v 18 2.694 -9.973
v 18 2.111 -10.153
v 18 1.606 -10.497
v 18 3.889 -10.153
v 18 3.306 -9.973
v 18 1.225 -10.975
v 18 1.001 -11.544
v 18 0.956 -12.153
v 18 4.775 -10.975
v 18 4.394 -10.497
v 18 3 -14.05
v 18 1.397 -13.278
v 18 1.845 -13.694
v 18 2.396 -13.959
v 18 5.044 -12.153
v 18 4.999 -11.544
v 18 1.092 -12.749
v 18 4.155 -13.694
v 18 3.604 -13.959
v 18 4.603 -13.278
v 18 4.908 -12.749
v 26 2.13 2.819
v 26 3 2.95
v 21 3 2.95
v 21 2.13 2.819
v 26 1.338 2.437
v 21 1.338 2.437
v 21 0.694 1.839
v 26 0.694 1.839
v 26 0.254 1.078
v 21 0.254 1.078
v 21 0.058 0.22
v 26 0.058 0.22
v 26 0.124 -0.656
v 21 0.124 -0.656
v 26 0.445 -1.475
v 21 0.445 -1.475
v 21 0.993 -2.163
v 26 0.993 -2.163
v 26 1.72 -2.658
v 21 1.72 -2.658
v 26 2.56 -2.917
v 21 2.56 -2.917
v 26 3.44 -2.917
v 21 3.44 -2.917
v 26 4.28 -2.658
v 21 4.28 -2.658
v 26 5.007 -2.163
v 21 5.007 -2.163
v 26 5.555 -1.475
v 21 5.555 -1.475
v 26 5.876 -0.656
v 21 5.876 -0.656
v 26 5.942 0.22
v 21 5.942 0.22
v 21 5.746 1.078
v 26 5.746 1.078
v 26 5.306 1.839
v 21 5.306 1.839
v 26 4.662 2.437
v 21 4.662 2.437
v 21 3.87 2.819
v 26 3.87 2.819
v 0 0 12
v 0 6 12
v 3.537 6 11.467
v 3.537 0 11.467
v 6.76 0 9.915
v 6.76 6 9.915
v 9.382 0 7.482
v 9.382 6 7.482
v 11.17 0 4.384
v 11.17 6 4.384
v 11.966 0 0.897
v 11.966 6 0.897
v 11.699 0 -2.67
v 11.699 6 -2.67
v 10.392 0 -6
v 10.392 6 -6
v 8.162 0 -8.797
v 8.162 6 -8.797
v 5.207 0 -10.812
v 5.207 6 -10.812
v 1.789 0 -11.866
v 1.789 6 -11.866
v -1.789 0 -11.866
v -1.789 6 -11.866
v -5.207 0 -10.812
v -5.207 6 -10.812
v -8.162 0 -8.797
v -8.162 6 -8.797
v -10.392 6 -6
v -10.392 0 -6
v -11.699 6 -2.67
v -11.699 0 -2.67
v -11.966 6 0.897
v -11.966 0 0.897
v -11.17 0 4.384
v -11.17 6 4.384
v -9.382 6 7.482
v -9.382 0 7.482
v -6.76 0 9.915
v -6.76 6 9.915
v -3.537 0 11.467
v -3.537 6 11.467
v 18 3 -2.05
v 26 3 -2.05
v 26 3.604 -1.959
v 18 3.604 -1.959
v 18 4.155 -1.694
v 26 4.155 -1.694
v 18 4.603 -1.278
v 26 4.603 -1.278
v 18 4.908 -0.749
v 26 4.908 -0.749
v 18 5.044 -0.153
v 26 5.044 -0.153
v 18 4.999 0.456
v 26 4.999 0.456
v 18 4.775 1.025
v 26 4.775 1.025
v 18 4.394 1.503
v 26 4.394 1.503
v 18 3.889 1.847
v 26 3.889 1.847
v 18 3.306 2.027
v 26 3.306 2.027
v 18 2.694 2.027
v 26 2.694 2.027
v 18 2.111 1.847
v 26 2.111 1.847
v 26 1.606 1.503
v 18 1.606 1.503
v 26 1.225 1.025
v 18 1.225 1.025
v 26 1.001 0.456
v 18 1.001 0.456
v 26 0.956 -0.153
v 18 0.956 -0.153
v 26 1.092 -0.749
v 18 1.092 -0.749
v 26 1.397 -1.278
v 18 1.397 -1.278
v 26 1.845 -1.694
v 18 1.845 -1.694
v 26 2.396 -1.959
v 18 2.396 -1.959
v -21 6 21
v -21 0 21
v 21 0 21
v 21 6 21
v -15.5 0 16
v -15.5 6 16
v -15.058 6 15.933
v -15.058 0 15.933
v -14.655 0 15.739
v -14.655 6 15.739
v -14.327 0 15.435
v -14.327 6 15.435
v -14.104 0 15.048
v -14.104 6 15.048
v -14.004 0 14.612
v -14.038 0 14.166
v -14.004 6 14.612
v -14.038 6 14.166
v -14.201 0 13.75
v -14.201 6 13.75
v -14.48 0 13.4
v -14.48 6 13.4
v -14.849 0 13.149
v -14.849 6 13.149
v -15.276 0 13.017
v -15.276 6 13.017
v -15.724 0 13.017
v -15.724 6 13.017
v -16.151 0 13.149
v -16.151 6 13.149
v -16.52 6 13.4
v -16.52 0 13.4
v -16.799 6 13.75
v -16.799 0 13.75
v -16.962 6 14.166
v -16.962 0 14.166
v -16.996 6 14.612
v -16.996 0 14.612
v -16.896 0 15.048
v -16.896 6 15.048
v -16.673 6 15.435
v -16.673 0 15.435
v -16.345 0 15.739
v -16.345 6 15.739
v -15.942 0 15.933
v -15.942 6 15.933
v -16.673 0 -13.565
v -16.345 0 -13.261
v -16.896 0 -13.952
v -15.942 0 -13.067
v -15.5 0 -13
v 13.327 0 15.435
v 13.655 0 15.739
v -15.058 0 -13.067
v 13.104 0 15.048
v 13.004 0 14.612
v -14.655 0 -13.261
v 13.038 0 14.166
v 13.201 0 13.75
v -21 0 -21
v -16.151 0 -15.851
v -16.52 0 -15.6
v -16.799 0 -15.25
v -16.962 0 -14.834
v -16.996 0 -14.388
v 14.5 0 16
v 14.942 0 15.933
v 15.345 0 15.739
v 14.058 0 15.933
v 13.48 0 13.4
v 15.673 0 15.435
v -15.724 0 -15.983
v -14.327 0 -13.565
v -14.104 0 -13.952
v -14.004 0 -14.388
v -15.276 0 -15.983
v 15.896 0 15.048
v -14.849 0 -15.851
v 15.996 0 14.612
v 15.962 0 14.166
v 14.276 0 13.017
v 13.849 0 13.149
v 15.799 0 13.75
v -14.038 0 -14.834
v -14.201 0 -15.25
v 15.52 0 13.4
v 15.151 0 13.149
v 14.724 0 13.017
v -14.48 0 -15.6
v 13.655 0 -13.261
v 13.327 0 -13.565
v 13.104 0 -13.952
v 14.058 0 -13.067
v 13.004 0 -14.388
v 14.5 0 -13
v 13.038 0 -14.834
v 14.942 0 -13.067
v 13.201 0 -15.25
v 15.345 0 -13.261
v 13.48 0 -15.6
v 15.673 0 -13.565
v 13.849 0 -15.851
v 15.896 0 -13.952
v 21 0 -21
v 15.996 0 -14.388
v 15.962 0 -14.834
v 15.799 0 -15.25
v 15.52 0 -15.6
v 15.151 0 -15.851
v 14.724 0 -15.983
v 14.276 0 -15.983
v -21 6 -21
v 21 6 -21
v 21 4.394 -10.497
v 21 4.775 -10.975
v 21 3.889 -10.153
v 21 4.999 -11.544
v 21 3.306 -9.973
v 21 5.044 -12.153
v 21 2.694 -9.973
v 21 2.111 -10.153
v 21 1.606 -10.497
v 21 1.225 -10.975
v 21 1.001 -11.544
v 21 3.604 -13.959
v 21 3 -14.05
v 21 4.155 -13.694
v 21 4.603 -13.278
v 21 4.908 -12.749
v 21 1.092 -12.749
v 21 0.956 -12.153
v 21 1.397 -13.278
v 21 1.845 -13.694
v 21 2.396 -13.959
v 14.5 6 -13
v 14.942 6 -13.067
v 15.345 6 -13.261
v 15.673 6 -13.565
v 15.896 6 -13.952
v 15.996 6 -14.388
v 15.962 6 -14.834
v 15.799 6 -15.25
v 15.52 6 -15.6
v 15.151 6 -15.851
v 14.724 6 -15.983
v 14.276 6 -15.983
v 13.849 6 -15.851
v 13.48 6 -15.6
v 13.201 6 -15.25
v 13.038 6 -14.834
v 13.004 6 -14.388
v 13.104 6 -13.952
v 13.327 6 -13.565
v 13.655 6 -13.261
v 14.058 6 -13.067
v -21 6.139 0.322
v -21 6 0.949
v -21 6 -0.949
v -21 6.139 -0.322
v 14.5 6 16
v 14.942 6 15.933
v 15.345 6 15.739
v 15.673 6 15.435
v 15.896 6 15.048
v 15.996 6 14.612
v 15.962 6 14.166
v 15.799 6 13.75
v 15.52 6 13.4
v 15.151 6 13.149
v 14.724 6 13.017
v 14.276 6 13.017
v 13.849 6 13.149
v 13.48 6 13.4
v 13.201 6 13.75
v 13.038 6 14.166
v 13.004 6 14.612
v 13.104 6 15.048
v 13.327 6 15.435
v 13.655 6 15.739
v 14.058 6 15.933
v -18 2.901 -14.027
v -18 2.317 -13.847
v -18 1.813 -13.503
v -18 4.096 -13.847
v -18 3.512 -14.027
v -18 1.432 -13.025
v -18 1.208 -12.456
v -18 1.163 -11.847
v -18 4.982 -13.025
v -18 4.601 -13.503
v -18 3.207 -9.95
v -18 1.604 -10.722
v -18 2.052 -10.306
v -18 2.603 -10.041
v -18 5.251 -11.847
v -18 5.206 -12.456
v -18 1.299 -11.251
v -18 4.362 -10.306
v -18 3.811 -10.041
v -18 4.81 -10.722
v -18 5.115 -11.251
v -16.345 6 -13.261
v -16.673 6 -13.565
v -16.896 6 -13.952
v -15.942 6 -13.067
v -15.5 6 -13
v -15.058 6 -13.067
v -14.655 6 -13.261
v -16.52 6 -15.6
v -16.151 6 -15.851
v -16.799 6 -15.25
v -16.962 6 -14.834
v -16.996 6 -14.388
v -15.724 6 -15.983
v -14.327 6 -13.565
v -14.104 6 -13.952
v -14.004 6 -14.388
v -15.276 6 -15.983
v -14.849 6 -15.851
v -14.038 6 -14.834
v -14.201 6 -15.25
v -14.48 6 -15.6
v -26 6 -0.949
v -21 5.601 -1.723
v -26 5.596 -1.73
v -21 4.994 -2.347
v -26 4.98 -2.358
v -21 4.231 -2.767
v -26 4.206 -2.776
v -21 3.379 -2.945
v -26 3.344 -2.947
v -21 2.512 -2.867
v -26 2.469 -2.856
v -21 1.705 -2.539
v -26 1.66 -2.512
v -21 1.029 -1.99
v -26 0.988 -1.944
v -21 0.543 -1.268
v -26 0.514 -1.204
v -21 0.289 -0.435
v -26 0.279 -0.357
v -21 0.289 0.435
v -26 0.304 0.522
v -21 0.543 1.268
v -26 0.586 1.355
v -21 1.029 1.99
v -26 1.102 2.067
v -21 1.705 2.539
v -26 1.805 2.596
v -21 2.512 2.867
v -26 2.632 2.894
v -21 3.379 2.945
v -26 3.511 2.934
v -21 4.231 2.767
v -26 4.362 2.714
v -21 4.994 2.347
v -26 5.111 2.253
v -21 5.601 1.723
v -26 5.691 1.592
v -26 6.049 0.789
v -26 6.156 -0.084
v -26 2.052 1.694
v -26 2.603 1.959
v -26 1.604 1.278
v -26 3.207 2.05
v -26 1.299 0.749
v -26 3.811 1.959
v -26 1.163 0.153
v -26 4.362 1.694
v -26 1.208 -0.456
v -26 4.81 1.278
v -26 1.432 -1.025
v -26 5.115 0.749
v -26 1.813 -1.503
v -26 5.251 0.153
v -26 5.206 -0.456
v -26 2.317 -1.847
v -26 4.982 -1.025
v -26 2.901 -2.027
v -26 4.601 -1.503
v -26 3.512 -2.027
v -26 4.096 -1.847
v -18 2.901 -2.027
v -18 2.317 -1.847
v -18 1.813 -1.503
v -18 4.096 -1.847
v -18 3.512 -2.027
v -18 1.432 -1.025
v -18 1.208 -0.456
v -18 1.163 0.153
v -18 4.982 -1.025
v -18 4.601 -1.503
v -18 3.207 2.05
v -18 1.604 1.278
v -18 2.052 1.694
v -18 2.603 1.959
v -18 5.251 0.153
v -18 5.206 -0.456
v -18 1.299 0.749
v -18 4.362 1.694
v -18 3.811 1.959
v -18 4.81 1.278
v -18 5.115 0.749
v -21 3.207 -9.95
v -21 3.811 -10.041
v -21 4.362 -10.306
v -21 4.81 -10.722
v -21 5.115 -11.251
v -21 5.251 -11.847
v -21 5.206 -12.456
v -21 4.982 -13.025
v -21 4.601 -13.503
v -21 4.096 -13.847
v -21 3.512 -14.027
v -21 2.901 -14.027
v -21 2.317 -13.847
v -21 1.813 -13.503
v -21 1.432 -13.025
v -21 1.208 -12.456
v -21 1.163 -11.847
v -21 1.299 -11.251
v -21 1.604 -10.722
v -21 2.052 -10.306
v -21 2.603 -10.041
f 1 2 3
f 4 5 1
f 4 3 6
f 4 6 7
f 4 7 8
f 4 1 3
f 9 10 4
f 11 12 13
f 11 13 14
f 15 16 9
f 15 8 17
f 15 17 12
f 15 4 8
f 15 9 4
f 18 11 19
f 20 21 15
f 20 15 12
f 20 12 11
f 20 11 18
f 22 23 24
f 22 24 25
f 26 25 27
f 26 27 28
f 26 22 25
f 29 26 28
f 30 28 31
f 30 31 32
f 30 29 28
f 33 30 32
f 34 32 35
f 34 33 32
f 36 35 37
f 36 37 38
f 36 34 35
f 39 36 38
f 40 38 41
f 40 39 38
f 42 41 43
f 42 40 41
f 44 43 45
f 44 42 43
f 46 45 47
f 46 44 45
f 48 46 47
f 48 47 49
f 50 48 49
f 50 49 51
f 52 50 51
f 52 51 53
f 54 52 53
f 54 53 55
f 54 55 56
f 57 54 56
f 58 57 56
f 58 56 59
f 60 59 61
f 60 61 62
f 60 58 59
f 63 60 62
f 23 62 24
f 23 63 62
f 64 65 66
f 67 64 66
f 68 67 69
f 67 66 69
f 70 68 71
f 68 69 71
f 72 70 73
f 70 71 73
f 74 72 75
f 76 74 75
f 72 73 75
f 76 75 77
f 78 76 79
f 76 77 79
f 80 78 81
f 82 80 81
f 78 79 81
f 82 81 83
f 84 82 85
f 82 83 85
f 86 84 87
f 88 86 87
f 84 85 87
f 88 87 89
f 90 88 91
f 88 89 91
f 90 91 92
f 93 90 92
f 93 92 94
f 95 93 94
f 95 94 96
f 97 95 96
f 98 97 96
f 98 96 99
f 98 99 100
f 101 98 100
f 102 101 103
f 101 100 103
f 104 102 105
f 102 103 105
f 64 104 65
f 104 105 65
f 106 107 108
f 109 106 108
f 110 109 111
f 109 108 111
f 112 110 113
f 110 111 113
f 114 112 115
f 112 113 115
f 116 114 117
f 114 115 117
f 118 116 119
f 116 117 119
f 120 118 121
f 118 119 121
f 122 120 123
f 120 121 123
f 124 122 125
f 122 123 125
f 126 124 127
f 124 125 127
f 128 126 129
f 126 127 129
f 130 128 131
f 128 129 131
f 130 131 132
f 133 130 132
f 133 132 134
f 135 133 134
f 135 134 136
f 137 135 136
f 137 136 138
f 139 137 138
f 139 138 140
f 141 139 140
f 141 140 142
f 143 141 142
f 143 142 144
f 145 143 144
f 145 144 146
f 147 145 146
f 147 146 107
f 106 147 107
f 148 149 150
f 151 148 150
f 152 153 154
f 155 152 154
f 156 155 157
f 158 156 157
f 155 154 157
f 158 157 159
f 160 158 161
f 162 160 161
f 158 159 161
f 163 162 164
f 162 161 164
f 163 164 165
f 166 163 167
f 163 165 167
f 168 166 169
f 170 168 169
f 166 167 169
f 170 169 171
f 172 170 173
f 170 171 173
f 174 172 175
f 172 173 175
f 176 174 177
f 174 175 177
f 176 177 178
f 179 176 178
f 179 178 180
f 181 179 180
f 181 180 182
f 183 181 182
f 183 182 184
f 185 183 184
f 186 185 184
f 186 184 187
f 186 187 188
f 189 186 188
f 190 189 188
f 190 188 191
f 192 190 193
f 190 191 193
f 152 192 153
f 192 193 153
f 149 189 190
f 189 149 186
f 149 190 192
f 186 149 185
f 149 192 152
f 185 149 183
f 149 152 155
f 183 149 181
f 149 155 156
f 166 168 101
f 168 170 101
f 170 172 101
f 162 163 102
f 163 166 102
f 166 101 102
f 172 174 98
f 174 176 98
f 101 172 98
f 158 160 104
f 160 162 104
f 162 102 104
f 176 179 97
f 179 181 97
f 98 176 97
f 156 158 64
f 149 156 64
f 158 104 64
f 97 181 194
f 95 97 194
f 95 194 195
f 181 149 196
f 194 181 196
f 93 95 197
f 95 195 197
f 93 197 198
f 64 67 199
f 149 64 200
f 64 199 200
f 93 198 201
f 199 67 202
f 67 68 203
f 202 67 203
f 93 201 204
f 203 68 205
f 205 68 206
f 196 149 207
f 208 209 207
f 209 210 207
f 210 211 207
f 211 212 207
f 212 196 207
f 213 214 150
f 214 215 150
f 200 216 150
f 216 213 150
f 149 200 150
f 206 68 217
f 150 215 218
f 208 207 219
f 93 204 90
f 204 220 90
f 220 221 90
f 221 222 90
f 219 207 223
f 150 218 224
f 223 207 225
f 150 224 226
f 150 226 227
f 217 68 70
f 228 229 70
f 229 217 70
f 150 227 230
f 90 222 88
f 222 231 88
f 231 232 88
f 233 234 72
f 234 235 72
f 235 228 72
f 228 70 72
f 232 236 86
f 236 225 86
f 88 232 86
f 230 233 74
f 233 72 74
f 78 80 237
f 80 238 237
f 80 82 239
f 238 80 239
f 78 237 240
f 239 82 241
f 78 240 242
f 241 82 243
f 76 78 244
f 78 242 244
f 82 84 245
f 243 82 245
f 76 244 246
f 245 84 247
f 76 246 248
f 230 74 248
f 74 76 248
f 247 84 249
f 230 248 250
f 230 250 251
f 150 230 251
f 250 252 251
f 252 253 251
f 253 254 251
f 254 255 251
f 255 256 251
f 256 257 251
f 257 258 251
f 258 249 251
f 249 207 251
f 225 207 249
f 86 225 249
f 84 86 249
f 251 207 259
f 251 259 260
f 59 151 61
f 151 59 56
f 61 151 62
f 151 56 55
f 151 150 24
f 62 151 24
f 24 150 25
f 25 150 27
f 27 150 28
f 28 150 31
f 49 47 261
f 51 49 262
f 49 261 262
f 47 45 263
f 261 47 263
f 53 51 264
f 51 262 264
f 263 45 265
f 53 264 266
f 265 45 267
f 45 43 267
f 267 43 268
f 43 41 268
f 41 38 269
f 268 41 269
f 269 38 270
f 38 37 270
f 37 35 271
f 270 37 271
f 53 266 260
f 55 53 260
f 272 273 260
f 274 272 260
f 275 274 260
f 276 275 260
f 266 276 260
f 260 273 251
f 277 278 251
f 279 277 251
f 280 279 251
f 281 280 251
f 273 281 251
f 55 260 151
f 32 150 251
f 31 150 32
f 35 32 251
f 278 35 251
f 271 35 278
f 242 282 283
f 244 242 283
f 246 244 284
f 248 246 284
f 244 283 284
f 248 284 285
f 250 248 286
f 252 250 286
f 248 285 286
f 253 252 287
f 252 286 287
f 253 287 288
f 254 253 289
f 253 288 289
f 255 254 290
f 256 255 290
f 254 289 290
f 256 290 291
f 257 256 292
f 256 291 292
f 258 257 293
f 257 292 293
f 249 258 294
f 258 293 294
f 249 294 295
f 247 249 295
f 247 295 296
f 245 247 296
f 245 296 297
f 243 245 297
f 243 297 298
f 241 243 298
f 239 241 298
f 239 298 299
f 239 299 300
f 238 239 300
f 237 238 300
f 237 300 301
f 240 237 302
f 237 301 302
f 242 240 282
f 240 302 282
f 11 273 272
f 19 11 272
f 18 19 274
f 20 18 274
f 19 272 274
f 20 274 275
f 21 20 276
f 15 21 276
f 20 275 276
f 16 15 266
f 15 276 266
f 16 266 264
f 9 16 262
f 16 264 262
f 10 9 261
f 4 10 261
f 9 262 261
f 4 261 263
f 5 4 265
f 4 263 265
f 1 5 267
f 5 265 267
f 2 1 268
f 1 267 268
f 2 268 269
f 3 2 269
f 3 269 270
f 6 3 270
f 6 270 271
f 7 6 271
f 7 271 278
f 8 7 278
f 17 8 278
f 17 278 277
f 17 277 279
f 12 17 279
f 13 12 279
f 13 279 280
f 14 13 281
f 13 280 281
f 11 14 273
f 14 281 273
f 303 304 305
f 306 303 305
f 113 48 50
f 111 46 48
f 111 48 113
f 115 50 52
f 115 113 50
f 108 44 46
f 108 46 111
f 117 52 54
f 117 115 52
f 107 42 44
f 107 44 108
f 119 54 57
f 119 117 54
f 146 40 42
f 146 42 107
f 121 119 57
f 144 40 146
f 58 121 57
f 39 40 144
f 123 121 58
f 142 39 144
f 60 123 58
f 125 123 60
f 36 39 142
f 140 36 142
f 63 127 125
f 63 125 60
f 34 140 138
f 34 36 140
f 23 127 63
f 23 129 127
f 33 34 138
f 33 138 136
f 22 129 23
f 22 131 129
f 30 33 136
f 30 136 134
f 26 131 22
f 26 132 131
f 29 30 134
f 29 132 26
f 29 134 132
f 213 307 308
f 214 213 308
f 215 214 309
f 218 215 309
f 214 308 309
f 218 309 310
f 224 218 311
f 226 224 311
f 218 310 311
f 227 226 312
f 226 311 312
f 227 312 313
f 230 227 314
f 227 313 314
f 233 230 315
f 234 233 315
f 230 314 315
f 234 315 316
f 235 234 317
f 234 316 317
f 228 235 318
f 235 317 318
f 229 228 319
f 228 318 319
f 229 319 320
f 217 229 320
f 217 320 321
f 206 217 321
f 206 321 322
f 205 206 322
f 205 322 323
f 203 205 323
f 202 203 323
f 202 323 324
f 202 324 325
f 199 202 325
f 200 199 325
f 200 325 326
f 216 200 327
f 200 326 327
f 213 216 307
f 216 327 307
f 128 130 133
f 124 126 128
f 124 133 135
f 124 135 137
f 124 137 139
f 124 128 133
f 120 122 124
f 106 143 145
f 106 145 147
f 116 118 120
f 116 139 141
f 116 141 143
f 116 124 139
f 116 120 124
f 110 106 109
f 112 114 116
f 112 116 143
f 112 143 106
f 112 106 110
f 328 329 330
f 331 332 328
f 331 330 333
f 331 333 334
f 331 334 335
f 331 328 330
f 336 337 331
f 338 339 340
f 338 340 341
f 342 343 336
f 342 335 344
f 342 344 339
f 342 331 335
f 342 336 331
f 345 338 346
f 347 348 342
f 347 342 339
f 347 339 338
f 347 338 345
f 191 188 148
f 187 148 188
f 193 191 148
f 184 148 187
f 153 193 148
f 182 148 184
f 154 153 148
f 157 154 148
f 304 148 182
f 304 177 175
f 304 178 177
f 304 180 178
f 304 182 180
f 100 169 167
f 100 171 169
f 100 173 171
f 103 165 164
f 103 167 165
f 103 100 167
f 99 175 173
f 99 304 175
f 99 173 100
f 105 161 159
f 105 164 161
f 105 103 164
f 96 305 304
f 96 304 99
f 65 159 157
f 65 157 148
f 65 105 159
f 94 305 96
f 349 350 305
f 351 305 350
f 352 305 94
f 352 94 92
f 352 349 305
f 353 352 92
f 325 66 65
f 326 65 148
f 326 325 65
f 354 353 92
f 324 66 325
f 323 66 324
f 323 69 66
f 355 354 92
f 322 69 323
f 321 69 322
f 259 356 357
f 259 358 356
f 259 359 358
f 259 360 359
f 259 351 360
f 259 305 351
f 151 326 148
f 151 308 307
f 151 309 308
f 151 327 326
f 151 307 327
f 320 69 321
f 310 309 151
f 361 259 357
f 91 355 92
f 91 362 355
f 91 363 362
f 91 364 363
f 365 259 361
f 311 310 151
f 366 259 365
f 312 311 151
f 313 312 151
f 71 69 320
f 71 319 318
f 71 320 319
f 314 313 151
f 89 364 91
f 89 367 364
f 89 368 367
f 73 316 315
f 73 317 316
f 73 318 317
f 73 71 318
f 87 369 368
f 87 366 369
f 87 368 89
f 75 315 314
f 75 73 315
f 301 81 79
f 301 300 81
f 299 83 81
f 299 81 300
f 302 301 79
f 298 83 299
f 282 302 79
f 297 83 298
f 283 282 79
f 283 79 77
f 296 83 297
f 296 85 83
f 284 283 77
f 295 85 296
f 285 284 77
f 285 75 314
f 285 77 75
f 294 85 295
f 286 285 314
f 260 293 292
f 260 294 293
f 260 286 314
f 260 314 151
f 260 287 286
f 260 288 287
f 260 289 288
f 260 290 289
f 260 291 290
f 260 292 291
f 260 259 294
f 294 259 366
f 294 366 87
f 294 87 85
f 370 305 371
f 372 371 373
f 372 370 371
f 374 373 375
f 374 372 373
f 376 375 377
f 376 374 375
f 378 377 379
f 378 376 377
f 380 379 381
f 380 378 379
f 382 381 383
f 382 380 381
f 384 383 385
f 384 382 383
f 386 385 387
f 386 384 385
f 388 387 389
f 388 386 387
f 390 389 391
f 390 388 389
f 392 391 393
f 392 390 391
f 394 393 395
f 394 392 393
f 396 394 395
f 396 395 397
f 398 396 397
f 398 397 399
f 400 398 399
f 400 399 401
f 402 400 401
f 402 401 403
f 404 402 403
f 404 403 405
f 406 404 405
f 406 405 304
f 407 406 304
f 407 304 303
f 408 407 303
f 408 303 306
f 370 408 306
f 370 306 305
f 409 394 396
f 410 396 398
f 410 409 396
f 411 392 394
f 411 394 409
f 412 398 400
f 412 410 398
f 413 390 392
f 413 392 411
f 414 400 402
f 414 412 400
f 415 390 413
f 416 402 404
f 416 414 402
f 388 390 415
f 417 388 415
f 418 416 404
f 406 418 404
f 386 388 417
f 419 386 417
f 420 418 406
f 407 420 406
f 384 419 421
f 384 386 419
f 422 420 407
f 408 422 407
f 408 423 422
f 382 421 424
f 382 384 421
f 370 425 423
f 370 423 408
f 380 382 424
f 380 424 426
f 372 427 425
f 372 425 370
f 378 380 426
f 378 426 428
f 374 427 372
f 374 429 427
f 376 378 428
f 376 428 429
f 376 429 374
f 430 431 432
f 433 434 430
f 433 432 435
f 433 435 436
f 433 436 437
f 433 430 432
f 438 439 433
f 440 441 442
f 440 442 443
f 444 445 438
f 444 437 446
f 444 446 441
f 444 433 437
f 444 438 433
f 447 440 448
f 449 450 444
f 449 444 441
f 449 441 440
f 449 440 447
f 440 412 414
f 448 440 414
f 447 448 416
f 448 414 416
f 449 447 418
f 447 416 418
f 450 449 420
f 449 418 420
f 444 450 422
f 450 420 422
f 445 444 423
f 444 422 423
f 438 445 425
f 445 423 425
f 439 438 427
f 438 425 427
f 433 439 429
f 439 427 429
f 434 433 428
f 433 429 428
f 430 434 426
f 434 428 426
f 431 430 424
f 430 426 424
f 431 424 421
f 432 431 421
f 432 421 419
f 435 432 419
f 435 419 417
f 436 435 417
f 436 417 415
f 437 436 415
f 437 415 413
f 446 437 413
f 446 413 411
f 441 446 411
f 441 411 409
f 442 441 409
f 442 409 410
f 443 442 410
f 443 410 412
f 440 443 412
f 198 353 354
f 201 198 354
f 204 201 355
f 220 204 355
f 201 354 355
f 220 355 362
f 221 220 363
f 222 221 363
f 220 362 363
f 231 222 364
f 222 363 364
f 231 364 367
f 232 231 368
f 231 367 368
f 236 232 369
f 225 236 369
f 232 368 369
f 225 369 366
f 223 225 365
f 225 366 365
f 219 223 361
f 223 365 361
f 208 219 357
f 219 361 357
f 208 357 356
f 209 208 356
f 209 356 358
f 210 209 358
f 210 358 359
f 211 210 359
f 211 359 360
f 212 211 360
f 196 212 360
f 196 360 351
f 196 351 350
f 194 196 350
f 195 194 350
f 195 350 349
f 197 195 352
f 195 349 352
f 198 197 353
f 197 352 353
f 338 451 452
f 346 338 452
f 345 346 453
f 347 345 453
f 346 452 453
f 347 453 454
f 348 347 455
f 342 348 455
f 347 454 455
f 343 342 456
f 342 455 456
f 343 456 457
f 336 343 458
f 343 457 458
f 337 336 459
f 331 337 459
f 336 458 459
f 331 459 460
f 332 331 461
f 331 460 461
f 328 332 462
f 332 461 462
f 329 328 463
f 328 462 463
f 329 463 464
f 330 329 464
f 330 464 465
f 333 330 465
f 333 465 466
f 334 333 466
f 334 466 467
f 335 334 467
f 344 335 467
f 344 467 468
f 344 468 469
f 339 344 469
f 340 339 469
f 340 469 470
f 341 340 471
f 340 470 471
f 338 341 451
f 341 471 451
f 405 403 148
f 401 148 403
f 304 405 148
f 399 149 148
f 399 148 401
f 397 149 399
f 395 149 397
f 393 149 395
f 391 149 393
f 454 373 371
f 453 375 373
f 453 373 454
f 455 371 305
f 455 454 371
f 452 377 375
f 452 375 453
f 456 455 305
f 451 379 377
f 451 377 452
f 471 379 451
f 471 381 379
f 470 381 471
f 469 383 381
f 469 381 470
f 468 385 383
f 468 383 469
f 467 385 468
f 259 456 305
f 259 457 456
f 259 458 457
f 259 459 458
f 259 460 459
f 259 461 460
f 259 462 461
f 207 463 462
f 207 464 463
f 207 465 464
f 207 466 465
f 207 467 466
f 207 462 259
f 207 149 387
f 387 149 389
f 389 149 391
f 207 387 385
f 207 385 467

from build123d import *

# Parameters (mm, degrees)
CROQUIS1_W              = 42
CROQUIS1_H              = 42
SALIENTE_EXTRUIR1_DEPTH = 6
CROQUIS2_R              = 1.5
CROQUIS2_R_2            = 12
CORTAR_EXTRUIR2_DEPTH   = 6
CROQUIS4_R              = 2.05
CORTAR_EXTRUIR3_DEPTH   = 3
CROQUIS5_R              = 2.05
CORTAR_EXTRUIR4_DEPTH   = 3
SALIENTE_EXTRUIR2_START = 5
CROQUIS6_R              = 2.95
CROQUIS6_R_2            = 2.05
SALIENTE_EXTRUIR2_DEPTH = 5
SALIENTE_EXTRUIR3_START = 5
CROQUIS7_R              = 2.95
CROQUIS7_R_2            = 2.05
SALIENTE_EXTRUIR3_DEPTH = 5


with BuildPart() as part:
    # Croquis1 → Saliente-Extruir1 (new body)
    with BuildSketch(Plane(origin=(0, 0, 0), x_dir=(1, 0, 0), z_dir=(0, 1, 0))):
        Rectangle(CROQUIS1_W, CROQUIS1_H)
    extrude(amount=SALIENTE_EXTRUIR1_DEPTH)

    # Croquis2 → Cortar-Extruir2 (cut)
    with BuildSketch(Plane(origin=(0, 6, 0), x_dir=(1, 0, 0), z_dir=(0, 1, 0))):
        with Locations(Location((-15.5, -14.5, 0), (0, 0, 270))):
            Circle(CROQUIS2_R)
        with Locations(Location((14.5, -14.5, 0), (0, 0, 270))):
            Circle(CROQUIS2_R)
        with Locations(Location((14.5, 14.5, 0), (0, 0, 270))):
            Circle(CROQUIS2_R)
        with Locations(Location((-15.5, 14.5, 0), (0, 0, 270))):
            Circle(CROQUIS2_R)
        with Locations(Location((0, 0, 0), (0, 0, 270))):
            Circle(CROQUIS2_R_2)
    extrude(amount=-CORTAR_EXTRUIR2_DEPTH, mode=Mode.SUBTRACT)

    # Croquis4 → Cortar-Extruir3 (cut)
    with BuildSketch(Plane(origin=(21, 0, 0), x_dir=(0, 0, -1), z_dir=(1, 0, 0))):
        with Locations((12, 3)):
            Circle(CROQUIS4_R)
        with Locations((0, 3)):
            Circle(CROQUIS4_R)
    extrude(amount=-CORTAR_EXTRUIR3_DEPTH, mode=Mode.SUBTRACT)

    # Croquis5 → Cortar-Extruir4 (cut)
    with BuildSketch(Plane.ZY.offset(21)):
        with Locations((-12, 3.206908841)):
            Circle(CROQUIS5_R)
        with Locations((0, 3.206908841)):
            Circle(CROQUIS5_R)
    extrude(amount=-CORTAR_EXTRUIR4_DEPTH, mode=Mode.SUBTRACT)

    # Croquis6 → Saliente-Extruir2 (add)
    with BuildSketch(Plane(origin=(21, 0, 0), x_dir=(0, 0, -1), z_dir=(1, 0, 0)).offset(SALIENTE_EXTRUIR2_START)):
        with Locations(Location((0, 3, 0), (0, 0, 180))):
            Circle(CROQUIS6_R)
        with Locations((0, 3)):
            Circle(CROQUIS6_R_2, mode=Mode.SUBTRACT)
    extrude(amount=-SALIENTE_EXTRUIR2_DEPTH)

    # Croquis7 → Saliente-Extruir3 (add)
    with BuildSketch(Plane.ZY.offset(21).offset(SALIENTE_EXTRUIR3_START)):
        with Locations(Location((0, 3.206908841, 0), (0, 0, 108.771300902))):
            Circle(CROQUIS7_R)
        with Locations((0, 3.206908841)):
            Circle(CROQUIS7_R_2, mode=Mode.SUBTRACT)
    extrude(amount=-SALIENTE_EXTRUIR3_DEPTH)


solid = part.part
